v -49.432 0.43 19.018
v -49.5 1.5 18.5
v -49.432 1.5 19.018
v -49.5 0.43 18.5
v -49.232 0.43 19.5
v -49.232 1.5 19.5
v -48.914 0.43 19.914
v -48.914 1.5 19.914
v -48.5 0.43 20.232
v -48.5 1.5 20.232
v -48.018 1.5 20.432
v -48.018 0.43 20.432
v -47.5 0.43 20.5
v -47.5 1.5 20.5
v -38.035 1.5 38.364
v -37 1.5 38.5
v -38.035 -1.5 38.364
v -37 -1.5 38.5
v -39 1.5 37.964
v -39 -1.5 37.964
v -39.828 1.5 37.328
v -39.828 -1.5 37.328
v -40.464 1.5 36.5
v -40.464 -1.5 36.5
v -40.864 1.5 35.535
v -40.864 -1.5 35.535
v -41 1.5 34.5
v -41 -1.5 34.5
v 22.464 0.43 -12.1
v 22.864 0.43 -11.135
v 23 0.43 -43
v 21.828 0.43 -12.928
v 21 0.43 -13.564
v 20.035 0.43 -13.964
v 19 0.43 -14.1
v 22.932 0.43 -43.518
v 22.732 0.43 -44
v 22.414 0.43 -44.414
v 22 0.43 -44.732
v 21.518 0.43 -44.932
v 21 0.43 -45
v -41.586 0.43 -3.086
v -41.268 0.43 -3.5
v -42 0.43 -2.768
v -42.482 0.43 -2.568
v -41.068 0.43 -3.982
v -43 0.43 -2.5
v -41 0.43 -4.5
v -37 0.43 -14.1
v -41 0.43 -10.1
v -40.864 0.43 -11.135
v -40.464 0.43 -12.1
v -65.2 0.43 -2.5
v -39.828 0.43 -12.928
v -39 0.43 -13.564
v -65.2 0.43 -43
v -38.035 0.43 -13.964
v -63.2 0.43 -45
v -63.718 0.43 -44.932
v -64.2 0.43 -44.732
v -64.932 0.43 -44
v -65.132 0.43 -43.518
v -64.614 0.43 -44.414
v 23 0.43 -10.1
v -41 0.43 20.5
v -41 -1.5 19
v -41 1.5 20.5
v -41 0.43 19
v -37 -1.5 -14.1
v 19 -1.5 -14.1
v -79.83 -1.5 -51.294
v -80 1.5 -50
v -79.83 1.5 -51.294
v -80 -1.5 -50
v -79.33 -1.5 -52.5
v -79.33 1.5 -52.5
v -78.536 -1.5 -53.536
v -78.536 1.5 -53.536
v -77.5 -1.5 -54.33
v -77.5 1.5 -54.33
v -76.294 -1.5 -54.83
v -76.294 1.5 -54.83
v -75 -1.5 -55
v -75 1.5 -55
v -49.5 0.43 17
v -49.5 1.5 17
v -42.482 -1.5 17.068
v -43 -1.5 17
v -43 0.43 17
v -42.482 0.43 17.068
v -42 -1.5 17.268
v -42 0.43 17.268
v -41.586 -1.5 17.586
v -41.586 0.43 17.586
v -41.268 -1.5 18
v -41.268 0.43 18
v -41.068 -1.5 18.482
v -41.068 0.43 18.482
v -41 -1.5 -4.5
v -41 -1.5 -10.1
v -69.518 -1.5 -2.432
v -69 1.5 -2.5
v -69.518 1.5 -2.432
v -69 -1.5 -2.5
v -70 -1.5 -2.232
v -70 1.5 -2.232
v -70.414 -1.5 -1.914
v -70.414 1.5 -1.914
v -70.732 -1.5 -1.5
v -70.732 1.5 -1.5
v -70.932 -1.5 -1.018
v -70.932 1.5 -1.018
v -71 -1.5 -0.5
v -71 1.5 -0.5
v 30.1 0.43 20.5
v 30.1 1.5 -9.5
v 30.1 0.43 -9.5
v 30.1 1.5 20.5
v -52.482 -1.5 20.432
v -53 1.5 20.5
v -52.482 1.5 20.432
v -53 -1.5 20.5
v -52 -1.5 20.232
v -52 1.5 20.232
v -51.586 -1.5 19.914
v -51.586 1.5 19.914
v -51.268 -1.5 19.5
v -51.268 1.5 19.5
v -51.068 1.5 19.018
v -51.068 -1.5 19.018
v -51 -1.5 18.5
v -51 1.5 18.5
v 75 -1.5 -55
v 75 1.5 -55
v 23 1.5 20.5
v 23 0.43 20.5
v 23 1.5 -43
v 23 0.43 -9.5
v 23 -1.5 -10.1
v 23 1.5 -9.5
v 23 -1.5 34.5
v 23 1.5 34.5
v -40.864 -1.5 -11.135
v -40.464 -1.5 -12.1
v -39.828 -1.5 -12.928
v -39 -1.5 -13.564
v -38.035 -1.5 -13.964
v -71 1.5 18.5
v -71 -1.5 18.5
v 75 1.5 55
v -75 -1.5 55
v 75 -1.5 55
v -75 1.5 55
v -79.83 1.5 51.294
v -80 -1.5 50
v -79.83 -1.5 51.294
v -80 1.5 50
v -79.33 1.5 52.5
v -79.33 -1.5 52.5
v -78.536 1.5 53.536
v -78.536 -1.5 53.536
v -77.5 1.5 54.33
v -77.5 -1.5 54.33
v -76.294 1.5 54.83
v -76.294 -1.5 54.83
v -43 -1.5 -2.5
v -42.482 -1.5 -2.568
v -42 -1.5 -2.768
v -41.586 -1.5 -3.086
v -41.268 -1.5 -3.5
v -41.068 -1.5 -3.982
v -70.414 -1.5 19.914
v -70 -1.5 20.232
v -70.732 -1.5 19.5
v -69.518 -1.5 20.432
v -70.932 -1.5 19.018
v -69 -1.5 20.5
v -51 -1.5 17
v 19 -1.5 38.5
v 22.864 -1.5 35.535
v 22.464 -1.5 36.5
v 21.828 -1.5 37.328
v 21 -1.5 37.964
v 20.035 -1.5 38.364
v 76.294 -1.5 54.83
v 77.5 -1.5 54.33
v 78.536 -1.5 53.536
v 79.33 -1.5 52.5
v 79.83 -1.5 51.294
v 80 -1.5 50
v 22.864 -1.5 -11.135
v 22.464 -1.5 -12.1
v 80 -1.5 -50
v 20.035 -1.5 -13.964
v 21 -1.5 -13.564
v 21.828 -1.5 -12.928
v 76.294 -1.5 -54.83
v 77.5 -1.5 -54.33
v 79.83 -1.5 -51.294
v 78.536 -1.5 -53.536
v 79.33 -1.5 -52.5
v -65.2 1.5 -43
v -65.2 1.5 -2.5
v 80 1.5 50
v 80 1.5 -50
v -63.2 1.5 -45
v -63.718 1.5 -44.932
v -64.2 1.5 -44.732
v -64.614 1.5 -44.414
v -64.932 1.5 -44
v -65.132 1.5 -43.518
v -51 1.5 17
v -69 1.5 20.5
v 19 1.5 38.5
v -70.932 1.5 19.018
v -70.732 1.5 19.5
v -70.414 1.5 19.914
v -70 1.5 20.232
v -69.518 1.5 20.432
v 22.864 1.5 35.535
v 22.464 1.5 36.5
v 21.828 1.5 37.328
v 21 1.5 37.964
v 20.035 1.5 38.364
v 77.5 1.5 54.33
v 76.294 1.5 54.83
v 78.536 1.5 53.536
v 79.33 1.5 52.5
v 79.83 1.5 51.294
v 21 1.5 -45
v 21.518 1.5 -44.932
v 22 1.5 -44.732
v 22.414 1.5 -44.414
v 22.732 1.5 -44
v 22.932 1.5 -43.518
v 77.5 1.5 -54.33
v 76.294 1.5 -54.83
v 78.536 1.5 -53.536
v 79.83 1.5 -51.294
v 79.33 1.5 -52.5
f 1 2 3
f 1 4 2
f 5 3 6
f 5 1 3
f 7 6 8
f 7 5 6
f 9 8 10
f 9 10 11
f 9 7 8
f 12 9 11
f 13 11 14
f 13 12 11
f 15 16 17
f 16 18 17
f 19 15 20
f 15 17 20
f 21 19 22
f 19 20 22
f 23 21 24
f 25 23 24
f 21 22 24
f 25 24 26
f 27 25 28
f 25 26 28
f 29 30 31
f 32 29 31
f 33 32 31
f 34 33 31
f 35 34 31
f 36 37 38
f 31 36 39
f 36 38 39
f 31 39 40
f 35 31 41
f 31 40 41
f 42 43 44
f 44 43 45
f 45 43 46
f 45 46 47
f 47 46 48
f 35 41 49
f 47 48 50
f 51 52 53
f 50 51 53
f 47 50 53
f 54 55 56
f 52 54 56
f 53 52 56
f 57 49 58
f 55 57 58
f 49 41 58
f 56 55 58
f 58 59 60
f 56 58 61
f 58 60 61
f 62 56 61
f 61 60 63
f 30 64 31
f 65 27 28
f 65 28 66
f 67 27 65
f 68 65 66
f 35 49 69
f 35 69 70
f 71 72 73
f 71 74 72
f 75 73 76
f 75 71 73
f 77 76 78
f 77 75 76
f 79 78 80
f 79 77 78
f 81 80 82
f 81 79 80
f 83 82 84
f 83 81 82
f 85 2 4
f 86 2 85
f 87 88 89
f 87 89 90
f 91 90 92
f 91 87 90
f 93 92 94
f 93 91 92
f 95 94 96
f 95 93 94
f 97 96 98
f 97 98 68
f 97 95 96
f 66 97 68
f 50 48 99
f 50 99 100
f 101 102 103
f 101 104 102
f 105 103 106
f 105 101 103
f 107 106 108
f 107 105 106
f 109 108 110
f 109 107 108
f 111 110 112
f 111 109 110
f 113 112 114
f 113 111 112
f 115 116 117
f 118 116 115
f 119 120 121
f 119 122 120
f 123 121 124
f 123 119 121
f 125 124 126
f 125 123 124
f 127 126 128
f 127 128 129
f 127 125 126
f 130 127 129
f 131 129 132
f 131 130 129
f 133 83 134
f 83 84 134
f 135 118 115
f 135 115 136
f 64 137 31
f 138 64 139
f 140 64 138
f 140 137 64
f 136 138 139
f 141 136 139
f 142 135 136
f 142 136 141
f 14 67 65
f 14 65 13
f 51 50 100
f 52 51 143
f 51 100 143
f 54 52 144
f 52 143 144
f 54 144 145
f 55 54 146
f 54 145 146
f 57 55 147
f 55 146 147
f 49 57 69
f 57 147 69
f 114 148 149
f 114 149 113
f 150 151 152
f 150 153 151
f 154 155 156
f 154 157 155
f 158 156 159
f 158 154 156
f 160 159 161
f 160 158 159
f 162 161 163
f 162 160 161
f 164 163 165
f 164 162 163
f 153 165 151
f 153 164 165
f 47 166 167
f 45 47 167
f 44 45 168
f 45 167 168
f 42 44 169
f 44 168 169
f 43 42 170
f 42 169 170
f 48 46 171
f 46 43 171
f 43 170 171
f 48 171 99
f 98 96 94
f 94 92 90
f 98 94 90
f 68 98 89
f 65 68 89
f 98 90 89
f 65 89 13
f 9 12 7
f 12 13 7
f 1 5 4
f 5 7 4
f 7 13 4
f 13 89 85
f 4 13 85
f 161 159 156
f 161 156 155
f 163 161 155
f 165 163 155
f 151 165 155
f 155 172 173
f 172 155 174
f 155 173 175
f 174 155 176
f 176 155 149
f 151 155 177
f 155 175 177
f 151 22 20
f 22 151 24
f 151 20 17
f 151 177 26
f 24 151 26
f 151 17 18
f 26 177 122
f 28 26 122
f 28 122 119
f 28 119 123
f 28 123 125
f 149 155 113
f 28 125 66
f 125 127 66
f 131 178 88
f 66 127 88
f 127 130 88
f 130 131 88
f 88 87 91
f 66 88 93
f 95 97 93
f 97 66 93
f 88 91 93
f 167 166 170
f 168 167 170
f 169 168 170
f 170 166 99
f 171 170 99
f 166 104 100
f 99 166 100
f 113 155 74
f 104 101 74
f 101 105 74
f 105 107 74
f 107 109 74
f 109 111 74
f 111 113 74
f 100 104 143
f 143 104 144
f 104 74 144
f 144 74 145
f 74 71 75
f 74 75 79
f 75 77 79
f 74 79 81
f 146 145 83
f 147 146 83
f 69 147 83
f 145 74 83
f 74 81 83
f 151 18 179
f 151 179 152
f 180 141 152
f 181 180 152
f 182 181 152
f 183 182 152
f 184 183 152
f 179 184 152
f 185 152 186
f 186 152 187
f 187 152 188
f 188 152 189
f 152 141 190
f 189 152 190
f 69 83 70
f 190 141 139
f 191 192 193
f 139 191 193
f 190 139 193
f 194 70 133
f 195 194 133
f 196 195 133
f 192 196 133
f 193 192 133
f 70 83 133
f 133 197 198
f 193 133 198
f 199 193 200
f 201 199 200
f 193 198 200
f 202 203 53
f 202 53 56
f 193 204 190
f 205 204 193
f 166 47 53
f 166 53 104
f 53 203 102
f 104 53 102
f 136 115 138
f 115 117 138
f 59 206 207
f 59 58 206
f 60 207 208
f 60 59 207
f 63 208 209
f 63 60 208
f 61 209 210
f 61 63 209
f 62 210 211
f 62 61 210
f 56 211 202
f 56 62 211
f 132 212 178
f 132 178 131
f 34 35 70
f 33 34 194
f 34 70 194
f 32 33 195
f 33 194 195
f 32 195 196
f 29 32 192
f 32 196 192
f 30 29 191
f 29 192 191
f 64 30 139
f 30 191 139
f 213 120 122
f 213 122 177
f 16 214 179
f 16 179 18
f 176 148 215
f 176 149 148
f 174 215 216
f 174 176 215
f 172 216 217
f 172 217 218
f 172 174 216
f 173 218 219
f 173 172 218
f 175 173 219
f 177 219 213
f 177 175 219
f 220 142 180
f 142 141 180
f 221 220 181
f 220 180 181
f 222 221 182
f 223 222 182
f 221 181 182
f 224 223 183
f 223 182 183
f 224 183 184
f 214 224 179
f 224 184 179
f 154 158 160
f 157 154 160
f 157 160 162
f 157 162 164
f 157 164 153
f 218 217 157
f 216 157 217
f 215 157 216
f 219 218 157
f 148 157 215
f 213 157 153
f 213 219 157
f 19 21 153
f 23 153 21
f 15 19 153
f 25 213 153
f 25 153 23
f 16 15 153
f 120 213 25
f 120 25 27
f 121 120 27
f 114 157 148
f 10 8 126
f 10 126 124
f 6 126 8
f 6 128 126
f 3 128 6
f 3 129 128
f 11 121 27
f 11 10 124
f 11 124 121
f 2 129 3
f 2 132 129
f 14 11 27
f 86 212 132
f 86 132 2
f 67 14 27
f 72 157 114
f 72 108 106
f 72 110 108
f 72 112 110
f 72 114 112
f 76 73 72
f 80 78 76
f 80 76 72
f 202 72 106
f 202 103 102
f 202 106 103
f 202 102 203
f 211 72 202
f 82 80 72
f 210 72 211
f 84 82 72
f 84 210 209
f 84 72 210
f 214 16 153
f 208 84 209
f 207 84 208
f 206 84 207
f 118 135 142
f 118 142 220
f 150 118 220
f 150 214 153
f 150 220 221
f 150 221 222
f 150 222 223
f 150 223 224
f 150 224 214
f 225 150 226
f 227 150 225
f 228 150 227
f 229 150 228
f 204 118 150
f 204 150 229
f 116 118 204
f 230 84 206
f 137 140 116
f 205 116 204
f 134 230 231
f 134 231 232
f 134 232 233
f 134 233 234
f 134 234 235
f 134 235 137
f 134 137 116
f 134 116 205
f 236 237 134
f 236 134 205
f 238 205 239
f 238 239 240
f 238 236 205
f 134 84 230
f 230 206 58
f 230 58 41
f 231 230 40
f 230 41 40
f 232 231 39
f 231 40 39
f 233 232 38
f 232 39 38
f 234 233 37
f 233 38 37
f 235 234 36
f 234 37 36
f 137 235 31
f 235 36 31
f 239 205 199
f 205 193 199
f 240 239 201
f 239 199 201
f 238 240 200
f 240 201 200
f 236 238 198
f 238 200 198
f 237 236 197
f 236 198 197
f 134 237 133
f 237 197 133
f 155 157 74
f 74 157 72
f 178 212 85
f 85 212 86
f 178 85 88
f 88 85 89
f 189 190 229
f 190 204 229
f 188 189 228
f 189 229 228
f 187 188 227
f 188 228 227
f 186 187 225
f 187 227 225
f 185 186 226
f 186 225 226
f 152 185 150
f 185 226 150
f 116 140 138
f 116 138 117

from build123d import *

# Parameters (mm, degrees)
SKETCH2_W           = 160
SKETCH2_H           = 110
BOSS_EXTRUDE1_DEPTH = 1.5
FILLET1_R           = 5
CUT_EXTRUDE1_DEPTH  = 4
FILLET2_R           = 2
FILLET3_R           = 4
CUT_EXTRUDE2_DEPTH  = 1.07
FILLET4_R           = 2


with BuildPart() as part:
    # Sketch2 → Boss-Extrude1 (new body, symmetric)
    with BuildSketch(Plane(origin=(0, 0, 0), x_dir=(1, 0, 0), z_dir=(0, 1, 0))):
        Rectangle(SKETCH2_W, SKETCH2_H)
    extrude(amount=BOSS_EXTRUDE1_DEPTH, both=True)

    # Fillet1
    fillet1_edges = [part.edges().sort_by_distance(p)[0] for p in [
        (80, 0, 55),
        (-80, 0, 55),
        (-80, 0, -55),
        (80, 0, -55),
    ]]
    fillet(fillet1_edges, radius=FILLET1_R)

    # Sketch3 → Cut-Extrude1 (cut, through all)
    with BuildSketch(Plane(origin=(0, 1.5, 0), x_dir=(1, 0, 0), z_dir=(0, 1, 0))):
        Polygon((-71, 2.5), (-51, 2.5), (-41, 2.5), (-41, 14.1), (23, 14.1), (23, -38.5), (-41, -38.5), (-41, -17), (-49.93, -17), (-51, -17), (-51, -20.5), (-71, -20.5), align=None)
    extrude(amount=-CUT_EXTRUDE1_DEPTH, mode=Mode.SUBTRACT)

    # Fillet2
    fillet2_edges = [part.edges().sort_by_distance(p)[0] for p in [
        (-51, 0, 20.5),
        (-71, 0, 20.5),
        (-71, 0, -2.5),
        (-41, 0, -2.5),
        (-41, 0, 17),
    ]]
    fillet(fillet2_edges, radius=FILLET2_R)

    # Fillet3
    fillet3_edges = [part.edges().sort_by_distance(p)[0] for p in [
        (-41, 0, -14.1),
        (23, 0, -14.1),
        (23, 0, 38.5),
        (-41, 0, 38.5),
    ]]
    fillet(fillet3_edges, radius=FILLET3_R)

    # Sketch4 → Cut-Extrude2 (cut)
    with BuildSketch(Plane(origin=(0, 1.5, 0), x_dir=(1, 0, 0), z_dir=(0, 1, 0))):
        with BuildLine():
            Line((-65.2, 2.5), (-65.2, 45))
            Line((-65.2, 45), (23, 45))
            Line((23, 45), (23, 10.1))
            ThreePointArc((23, 10.1), (21.828427125, 12.928427125), (19, 14.1))
            Line((19, 14.1), (-37, 14.1))
            ThreePointArc((-37, 14.1), (-39.828427125, 12.928427125), (-41, 10.1))
            Line((-41, 10.1), (-41, 9.5))
            Line((-41, 9.5), (30.1, 9.5))
            Line((30.1, 9.5), (30.1, -20.5))
            Line((30.1, -20.5), (-49.5, -20.5))
            Line((-49.5, -20.5), (-49.5, 2.5))
            Line((-49.5, 2.5), (-65.2, 2.5))
        make_face()
    extrude(amount=-CUT_EXTRUDE2_DEPTH, mode=Mode.SUBTRACT)

    # Fillet4
    fillet4_edges = [part.edges().sort_by_distance(p)[0] for p in [
        (-49.5, 0.965, 20.5),
        (-65.2, 0.965, -45),
        (23, 0.965, -45),
    ]]
    fillet(fillet4_edges, radius=FILLET4_R)


solid = part.part
